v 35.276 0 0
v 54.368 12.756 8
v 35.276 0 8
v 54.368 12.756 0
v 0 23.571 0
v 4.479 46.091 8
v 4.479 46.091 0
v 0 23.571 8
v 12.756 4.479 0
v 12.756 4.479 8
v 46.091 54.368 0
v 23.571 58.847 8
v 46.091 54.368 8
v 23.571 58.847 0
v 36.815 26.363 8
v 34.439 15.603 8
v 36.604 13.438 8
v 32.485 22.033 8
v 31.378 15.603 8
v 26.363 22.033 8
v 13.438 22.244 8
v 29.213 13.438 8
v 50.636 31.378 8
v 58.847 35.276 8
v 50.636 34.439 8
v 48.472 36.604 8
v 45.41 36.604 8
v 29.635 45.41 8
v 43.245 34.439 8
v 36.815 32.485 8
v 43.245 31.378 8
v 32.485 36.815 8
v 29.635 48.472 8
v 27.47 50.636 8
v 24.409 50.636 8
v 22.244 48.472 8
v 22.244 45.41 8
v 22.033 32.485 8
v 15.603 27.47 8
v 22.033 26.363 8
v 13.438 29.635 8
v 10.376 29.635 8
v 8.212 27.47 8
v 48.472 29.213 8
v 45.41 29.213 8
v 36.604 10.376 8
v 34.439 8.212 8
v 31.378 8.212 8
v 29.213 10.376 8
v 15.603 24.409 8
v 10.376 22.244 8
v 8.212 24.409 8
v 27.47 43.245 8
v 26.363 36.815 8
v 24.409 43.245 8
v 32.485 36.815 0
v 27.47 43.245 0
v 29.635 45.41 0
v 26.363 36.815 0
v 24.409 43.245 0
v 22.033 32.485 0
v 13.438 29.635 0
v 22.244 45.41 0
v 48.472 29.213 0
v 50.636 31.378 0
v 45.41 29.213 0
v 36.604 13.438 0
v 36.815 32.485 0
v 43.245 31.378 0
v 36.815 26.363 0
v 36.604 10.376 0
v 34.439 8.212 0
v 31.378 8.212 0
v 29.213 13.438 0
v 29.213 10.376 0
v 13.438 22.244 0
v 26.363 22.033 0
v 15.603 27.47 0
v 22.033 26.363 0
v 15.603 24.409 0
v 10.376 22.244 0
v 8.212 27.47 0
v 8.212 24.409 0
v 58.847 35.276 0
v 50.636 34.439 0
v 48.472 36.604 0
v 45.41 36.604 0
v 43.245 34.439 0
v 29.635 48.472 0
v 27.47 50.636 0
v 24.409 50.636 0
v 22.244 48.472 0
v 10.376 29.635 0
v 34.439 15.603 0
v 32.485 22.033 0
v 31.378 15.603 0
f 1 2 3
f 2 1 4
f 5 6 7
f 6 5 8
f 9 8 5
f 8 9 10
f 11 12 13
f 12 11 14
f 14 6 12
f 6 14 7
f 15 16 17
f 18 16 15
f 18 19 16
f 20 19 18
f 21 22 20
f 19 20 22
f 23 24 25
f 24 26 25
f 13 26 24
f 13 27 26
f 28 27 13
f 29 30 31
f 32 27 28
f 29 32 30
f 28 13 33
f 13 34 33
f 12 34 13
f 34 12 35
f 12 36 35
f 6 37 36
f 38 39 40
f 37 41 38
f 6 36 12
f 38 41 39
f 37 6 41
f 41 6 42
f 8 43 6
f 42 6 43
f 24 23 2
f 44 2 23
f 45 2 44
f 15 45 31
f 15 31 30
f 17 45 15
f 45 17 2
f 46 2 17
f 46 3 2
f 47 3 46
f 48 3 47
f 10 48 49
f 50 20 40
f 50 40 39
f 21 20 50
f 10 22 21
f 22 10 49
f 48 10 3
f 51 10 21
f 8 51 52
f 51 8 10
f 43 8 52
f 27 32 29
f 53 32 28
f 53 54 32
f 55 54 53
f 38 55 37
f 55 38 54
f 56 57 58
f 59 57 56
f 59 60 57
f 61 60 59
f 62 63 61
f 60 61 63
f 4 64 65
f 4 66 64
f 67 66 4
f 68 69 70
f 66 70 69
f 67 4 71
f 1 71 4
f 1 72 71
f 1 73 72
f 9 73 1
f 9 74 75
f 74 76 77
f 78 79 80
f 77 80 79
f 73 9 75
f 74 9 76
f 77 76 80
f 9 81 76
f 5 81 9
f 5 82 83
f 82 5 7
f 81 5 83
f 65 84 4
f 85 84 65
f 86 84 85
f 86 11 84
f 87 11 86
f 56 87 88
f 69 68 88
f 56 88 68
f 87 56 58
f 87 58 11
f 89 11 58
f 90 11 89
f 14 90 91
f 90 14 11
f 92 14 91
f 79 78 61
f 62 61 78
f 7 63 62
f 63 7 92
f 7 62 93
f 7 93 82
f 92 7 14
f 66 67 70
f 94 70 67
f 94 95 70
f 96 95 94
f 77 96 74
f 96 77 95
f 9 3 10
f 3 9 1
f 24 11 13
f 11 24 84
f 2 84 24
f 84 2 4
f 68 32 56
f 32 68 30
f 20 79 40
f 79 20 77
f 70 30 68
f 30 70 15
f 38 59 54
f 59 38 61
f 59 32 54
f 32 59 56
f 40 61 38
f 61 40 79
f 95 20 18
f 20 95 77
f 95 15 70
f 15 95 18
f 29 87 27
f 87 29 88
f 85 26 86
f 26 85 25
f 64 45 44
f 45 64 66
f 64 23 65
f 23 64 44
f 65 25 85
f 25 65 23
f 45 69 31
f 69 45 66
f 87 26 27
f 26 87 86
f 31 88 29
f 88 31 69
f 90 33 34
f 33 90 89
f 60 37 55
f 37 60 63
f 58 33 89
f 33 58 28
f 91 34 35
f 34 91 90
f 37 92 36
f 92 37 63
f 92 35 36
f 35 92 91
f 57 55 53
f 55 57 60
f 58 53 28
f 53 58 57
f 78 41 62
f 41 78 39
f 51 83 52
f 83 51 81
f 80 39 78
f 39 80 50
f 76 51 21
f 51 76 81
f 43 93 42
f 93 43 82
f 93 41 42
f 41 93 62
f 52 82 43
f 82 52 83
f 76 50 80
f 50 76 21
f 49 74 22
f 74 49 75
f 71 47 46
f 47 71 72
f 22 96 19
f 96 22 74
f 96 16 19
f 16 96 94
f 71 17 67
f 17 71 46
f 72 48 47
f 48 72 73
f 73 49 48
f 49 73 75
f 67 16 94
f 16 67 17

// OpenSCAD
$fn = 32;

// ----------------------------------------------------------------------
// Polygon plate: 8-gon R30, 4 bolt windows
// ----------------------------------------------------------------------

// --- parameters (mm) ---
sides = 8;                // number of polygon sides
plate_r = 30;             // circumscribed radius of the polygon
bore_r = 8;               // centre bore radius
bolts = 4;                // number of bolt windows
ring_r = 17.86;           // bolt-circle radius
bolt_r = 4;               // bolt window radius
plate_t = 8;              // plate thickness, Z (extrusion height)

plate_d = 2 * plate_r;  // circumscribed diameter
bore_d = 2 * bore_r;  // centre bore diameter
bolt_d = 2 * bolt_r;  // bolt window diameter
ring_d = 2 * ring_r;  // bolt-circle diameter

profile = [[58.847, 35.276], [46.091, 54.368], [23.571, 58.847], [4.479, 46.091], [0, 23.571], [12.756, 4.479], [35.276, 0], [54.368, 12.756]];  // primary outline, 8 points, counter clockwise
void_1 = [[36.815, 32.485], [32.485, 36.815], [26.363, 36.815], [22.033, 32.485], [22.033, 26.363], [26.363, 22.033], [32.485, 22.033], [36.815, 26.363]];  // centre bore, 8 points
void_2 = [[50.636, 34.439], [48.472, 36.604], [45.41, 36.604], [43.245, 34.439], [43.245, 31.378], [45.41, 29.213], [48.472, 29.213], [50.636, 31.378]];  // bolt window 1, 8 points
void_3 = [[29.635, 48.472], [27.47, 50.636], [24.409, 50.636], [22.244, 48.472], [22.244, 45.41], [24.409, 43.245], [27.47, 43.245], [29.635, 45.41]];  // bolt window 2, 8 points
void_4 = [[15.603, 27.47], [13.438, 29.635], [10.376, 29.635], [8.212, 27.47], [8.212, 24.409], [10.376, 22.244], [13.438, 22.244], [15.603, 24.409]];  // bolt window 3, 8 points
void_5 = [[36.604, 13.438], [34.439, 15.603], [31.378, 15.603], [29.213, 13.438], [29.213, 10.376], [31.378, 8.212], [34.439, 8.212], [36.604, 10.376]];  // bolt window 4, 8 points

// --- the one profile operation ---
difference() {
  linear_extrude(height = plate_t) polygon(points = profile);
  translate([0, 0, -1])
    linear_extrude(height = plate_t + 2) polygon(points = void_1);
  translate([0, 0, -1])
    linear_extrude(height = plate_t + 2) polygon(points = void_2);
  translate([0, 0, -1])
    linear_extrude(height = plate_t + 2) polygon(points = void_3);
  translate([0, 0, -1])
    linear_extrude(height = plate_t + 2) polygon(points = void_4);
  translate([0, 0, -1])
    linear_extrude(height = plate_t + 2) polygon(points = void_5);
}
